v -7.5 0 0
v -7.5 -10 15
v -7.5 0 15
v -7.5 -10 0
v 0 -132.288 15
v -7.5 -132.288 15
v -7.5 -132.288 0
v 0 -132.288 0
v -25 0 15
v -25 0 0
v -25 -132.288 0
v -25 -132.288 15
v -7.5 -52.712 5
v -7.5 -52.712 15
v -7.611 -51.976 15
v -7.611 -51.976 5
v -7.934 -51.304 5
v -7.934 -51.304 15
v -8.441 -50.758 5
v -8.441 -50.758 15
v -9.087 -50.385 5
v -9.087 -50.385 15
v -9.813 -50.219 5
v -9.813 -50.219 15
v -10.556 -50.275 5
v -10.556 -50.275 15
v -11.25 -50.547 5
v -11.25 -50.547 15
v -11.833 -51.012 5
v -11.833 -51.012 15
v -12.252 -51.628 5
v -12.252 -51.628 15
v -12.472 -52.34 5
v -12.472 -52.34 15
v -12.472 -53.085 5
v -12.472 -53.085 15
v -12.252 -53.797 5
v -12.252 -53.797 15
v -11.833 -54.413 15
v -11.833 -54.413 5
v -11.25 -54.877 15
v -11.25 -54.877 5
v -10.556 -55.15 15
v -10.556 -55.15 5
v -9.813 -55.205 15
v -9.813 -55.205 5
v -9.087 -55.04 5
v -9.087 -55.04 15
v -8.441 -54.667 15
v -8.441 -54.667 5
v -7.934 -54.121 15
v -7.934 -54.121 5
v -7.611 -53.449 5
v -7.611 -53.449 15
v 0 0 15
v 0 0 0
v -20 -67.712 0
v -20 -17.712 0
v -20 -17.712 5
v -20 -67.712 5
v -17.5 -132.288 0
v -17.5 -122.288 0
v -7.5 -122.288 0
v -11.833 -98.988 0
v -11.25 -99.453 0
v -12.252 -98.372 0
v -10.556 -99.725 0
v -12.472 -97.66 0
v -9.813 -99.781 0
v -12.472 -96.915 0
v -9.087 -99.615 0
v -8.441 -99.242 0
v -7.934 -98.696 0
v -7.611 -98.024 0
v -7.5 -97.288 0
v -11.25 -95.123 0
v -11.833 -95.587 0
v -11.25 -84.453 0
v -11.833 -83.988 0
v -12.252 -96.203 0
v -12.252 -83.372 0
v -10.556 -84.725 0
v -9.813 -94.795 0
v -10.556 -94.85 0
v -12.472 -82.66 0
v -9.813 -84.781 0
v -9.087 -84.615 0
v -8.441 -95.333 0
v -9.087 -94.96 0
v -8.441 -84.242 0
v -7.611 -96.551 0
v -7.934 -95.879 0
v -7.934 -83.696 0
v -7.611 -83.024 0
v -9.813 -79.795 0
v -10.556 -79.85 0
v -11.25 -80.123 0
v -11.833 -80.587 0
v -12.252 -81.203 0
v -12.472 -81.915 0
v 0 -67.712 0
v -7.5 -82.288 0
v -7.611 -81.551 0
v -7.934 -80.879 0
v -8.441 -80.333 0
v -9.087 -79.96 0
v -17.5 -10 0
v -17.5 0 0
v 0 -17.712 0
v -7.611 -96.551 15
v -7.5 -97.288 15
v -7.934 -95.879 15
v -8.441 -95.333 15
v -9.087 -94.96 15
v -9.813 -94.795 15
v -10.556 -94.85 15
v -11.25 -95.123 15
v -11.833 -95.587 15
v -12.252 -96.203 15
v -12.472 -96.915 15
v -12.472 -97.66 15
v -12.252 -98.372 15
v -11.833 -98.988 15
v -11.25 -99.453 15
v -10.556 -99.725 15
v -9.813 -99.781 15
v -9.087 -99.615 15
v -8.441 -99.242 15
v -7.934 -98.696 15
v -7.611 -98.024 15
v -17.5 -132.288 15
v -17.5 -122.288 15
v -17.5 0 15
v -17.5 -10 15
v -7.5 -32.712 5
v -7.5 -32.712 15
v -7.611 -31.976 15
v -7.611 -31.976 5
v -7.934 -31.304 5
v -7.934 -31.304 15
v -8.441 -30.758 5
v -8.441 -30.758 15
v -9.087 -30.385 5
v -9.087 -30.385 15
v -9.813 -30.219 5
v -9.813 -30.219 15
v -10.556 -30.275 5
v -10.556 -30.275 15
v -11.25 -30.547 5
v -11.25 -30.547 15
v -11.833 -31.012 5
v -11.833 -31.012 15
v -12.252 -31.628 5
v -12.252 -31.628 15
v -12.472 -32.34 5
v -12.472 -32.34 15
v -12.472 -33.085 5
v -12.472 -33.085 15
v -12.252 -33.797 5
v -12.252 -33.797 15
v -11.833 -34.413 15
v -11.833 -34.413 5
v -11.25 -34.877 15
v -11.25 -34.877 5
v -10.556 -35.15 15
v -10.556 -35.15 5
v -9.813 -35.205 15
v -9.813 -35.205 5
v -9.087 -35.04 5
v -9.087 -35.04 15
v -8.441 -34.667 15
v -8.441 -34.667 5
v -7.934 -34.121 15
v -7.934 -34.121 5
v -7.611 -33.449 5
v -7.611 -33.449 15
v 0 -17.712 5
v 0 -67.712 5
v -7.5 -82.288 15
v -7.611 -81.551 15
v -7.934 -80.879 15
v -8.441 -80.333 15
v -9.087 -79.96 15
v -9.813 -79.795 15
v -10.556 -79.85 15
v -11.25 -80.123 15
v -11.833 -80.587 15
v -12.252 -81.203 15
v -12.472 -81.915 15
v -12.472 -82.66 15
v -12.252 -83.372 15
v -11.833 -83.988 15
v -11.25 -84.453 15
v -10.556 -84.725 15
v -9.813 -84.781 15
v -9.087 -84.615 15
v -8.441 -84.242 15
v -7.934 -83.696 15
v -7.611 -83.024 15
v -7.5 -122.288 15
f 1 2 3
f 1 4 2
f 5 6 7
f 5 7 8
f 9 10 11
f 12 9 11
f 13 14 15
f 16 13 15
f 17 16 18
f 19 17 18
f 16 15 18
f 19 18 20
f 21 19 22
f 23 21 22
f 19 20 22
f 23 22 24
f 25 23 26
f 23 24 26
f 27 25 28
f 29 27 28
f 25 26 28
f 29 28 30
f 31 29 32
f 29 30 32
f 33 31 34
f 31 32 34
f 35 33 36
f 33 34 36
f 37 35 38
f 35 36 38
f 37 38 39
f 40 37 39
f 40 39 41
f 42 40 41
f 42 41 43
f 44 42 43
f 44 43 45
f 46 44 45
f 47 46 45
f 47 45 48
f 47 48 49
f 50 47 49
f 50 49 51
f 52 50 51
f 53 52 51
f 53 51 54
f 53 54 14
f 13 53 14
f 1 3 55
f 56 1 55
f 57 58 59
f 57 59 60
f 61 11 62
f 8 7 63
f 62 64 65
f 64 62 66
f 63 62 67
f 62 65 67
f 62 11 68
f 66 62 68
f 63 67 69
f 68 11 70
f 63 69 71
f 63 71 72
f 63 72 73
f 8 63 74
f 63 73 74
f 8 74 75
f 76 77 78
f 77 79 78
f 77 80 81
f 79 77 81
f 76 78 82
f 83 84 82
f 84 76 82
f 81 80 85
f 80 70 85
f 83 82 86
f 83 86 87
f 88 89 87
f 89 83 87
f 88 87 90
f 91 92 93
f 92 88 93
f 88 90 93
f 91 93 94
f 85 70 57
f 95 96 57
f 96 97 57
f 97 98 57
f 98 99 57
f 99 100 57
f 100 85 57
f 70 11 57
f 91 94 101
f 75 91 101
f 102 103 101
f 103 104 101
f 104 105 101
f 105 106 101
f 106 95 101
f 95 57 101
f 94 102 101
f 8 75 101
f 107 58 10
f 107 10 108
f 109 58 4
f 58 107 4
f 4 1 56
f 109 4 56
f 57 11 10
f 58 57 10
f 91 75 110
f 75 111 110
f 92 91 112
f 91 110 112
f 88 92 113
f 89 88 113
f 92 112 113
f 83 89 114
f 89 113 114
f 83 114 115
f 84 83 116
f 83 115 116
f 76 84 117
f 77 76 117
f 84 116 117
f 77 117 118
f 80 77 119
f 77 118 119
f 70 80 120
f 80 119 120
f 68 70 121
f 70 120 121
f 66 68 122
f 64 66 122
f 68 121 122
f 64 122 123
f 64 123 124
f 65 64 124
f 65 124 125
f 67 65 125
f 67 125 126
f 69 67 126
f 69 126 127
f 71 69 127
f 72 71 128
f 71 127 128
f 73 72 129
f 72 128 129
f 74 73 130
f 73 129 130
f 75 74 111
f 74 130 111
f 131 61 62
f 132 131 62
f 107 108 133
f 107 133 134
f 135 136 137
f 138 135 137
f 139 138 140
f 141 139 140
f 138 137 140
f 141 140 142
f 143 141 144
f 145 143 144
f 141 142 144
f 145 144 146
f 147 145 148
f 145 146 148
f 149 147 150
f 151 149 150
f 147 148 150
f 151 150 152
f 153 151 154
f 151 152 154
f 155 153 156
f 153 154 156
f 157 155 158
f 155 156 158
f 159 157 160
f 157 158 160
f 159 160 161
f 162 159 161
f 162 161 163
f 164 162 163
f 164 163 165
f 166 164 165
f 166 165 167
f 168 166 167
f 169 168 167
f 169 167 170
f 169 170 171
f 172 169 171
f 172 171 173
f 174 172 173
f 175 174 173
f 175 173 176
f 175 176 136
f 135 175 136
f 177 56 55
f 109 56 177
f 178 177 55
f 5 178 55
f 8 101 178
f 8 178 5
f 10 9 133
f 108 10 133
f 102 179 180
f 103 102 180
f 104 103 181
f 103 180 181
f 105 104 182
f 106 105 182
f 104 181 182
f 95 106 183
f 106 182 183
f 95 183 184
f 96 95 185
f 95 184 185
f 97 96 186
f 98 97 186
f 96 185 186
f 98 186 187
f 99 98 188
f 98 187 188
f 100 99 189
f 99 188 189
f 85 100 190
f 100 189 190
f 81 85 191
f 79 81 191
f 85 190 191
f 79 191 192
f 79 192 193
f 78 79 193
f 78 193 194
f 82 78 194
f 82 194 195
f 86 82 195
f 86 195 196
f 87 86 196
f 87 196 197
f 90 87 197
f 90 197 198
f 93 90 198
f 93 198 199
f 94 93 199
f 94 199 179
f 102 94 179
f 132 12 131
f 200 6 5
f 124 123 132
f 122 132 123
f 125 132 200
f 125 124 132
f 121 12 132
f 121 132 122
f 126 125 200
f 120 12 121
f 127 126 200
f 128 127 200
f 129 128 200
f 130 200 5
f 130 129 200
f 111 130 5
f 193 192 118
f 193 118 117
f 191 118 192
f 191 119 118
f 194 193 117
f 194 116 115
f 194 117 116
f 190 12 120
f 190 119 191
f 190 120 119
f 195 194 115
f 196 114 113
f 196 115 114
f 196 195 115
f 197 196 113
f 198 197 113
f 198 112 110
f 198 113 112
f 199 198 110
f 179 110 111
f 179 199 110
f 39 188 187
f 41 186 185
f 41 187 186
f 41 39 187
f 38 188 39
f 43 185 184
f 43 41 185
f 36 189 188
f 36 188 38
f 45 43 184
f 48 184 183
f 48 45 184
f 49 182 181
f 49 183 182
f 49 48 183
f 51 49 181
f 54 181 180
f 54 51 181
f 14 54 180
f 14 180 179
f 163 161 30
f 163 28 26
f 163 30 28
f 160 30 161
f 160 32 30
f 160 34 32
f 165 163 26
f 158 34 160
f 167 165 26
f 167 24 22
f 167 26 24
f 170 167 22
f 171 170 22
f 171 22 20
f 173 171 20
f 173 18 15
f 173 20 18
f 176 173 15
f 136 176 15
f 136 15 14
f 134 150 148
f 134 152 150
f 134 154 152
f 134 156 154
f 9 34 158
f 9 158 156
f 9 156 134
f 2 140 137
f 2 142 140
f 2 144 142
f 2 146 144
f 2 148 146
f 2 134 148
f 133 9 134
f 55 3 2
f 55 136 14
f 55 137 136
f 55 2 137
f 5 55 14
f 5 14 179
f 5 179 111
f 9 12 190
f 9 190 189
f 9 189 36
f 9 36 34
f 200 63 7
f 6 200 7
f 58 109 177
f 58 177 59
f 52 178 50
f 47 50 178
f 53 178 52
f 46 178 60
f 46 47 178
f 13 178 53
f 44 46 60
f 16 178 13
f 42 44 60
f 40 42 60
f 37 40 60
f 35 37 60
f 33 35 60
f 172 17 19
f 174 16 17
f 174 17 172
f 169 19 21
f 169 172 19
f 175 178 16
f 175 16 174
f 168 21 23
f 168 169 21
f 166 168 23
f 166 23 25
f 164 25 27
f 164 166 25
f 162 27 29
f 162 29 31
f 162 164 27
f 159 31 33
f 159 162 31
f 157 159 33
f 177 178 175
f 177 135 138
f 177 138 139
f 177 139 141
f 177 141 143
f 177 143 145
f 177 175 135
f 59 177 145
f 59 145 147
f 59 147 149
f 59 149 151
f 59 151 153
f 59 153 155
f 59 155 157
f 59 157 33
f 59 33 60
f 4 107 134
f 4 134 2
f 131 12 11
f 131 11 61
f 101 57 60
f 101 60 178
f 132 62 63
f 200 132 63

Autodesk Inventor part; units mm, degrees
ref_plane "YZ Plane" through (0, 0, 0) normal (1, 0, 0) x (0, 1, 0)
ref_plane "XZ Plane" through (0, 0, 0) normal (0, 1, 0) x (-1, 0, 0)
ref_plane "XY Plane" through (0, 0, 0) normal (0, 0, 1) x (1, 0, 0)
sketch "Sketch1" plane through (0, 0, 0) normal (0, 0, 1) x (1, 0, 0)
  circle A0 centre (-175, 0) radius 225 construction
  circle A1 centre (-175, 0) radius 200 construction
  line L0 (-25, 0) -> (-25, -132.2876)
  line L1 (-17.5, 0) -> (-17.5, -10)
  line L2 (-17.5, -10) -> (-7.5, -10)
  line L3 (-17.5, -10) -> (-7.5, -10) construction
  line L4 (-7.5, -10) -> (-7.5, 0)
  line L5 (-25, 0) -> (-17.5, 0)
  line L6 (-7.5, 0) -> (0, 0)
  line L7 (0, 0) -> (0, -132.2876)
  line L8 (-17.5, -132.2876) -> (-17.5, -122.2876)
  line L9 (-17.5, -132.2876) -> (-7.5, -132.2876) construction
  line L10 (-17.5, -122.2876) -> (-7.5, -122.2876)
  line L11 (-7.5, -122.2876) -> (-7.5, -132.2876)
  line L12 (-25, -132.2876) -> (-17.5, -132.2876)
  line L13 (-7.5, -132.2876) -> (0, -132.2876)
  dimension "d0" = 450
  dimension "d1" = 25
  dimension "d2" = 175
  dimension "d3" = 25
  dimension "d5" = 10
  dimension "d6" = 10
  dimension "d7" = 0
  dimension "d8" = 7.5
  dimension "d11" = 10
  dimension "d12" = 90
  dimension "d13" = 10
  dimension "d14" = 90
extrude "Extrusion1" add sketch "Sketch1" along normal blind 15
sketch "Sketch2" plane through (0, 0, 15) normal (0, 0, 1) x (1, 0, 0)
  line L0 (0, -17.7124) -> (-20, -17.7124) construction
  line L1 (-20, -17.7124) -> (-20, -67.7124) construction
  line L2 (-20, -67.7124) -> (0, -67.7124) construction
  line L3 (0, -67.7124) -> (0, -17.7124) construction
  line L4 (-7.5, -132.2876) -> (0, -132.2876) construction
  circle A0 centre (-10, -32.7124) radius 2.5
  circle A1 centre (-10, -52.7124) radius 2.5
  point P0 (0, 0)
  dimension "d15" = 20
  dimension "d16" = 50
  dimension "d17" = 64.5751
  dimension "d18" = 5
  dimension "d19" = 5
  dimension "d20" = 15
  dimension "d21" = 15
  dimension "d22" = 10
  dimension "d23" = 10
extrude "Extrusion2" cut sketch "Sketch2" against normal through all
thread "Thread1" size "M5x0.8" class "6H" standard "ANSI Metric M Profile" full length
thread "Thread2" size "M5x0.8" class "6H" standard "ANSI Metric M Profile" full length
sketch "Sketch3" plane through (0, 0, 15) normal (0, 0, 1) x (1, 0, 0)
  circle A0 centre (-10, -82.2876) radius 2.5
  circle A1 centre (-10, -97.2876) radius 2.5
  line L0 (0, -132.2876) -> (0, 0) projected
  line L1 (-7.5, -132.2876) -> (0, -132.2876) projected
  dimension "d30" = 5
  dimension "d31" = 5
  dimension "d32" = 10
  dimension "d33" = 10
  dimension "d34" = 15
  dimension "d35" = 35
extrude "Extrusion3" cut sketch "Sketch3" against normal through all
thread "Thread3" size "M5x0.8" class "6H" standard "ANSI Metric M Profile" full length
thread "Thread4" size "M5x0.8" class "6H" standard "ANSI Metric M Profile" full length
sketch "Sketch5" plane through (0, 0, 0) normal (0, 0, -1) x (-1, 0, 0)
  line L0 (0, -17.7124) -> (20, -17.7124)
  line L1 (20, -17.7124) -> (20, -67.7124)
  line L2 (20, -67.7124) -> (0, -67.7124)
  line L3 (0, -67.7124) -> (0, -17.7124)
  point P0 (0, 0)
  dimension "d50" = 20
  dimension "d51" = 50
  dimension "d52" = 17.7124
extrude "Extrusion5" cut sketch "Sketch5" against normal blind 5
properties part number "CP002" material "ABS Plastic"
